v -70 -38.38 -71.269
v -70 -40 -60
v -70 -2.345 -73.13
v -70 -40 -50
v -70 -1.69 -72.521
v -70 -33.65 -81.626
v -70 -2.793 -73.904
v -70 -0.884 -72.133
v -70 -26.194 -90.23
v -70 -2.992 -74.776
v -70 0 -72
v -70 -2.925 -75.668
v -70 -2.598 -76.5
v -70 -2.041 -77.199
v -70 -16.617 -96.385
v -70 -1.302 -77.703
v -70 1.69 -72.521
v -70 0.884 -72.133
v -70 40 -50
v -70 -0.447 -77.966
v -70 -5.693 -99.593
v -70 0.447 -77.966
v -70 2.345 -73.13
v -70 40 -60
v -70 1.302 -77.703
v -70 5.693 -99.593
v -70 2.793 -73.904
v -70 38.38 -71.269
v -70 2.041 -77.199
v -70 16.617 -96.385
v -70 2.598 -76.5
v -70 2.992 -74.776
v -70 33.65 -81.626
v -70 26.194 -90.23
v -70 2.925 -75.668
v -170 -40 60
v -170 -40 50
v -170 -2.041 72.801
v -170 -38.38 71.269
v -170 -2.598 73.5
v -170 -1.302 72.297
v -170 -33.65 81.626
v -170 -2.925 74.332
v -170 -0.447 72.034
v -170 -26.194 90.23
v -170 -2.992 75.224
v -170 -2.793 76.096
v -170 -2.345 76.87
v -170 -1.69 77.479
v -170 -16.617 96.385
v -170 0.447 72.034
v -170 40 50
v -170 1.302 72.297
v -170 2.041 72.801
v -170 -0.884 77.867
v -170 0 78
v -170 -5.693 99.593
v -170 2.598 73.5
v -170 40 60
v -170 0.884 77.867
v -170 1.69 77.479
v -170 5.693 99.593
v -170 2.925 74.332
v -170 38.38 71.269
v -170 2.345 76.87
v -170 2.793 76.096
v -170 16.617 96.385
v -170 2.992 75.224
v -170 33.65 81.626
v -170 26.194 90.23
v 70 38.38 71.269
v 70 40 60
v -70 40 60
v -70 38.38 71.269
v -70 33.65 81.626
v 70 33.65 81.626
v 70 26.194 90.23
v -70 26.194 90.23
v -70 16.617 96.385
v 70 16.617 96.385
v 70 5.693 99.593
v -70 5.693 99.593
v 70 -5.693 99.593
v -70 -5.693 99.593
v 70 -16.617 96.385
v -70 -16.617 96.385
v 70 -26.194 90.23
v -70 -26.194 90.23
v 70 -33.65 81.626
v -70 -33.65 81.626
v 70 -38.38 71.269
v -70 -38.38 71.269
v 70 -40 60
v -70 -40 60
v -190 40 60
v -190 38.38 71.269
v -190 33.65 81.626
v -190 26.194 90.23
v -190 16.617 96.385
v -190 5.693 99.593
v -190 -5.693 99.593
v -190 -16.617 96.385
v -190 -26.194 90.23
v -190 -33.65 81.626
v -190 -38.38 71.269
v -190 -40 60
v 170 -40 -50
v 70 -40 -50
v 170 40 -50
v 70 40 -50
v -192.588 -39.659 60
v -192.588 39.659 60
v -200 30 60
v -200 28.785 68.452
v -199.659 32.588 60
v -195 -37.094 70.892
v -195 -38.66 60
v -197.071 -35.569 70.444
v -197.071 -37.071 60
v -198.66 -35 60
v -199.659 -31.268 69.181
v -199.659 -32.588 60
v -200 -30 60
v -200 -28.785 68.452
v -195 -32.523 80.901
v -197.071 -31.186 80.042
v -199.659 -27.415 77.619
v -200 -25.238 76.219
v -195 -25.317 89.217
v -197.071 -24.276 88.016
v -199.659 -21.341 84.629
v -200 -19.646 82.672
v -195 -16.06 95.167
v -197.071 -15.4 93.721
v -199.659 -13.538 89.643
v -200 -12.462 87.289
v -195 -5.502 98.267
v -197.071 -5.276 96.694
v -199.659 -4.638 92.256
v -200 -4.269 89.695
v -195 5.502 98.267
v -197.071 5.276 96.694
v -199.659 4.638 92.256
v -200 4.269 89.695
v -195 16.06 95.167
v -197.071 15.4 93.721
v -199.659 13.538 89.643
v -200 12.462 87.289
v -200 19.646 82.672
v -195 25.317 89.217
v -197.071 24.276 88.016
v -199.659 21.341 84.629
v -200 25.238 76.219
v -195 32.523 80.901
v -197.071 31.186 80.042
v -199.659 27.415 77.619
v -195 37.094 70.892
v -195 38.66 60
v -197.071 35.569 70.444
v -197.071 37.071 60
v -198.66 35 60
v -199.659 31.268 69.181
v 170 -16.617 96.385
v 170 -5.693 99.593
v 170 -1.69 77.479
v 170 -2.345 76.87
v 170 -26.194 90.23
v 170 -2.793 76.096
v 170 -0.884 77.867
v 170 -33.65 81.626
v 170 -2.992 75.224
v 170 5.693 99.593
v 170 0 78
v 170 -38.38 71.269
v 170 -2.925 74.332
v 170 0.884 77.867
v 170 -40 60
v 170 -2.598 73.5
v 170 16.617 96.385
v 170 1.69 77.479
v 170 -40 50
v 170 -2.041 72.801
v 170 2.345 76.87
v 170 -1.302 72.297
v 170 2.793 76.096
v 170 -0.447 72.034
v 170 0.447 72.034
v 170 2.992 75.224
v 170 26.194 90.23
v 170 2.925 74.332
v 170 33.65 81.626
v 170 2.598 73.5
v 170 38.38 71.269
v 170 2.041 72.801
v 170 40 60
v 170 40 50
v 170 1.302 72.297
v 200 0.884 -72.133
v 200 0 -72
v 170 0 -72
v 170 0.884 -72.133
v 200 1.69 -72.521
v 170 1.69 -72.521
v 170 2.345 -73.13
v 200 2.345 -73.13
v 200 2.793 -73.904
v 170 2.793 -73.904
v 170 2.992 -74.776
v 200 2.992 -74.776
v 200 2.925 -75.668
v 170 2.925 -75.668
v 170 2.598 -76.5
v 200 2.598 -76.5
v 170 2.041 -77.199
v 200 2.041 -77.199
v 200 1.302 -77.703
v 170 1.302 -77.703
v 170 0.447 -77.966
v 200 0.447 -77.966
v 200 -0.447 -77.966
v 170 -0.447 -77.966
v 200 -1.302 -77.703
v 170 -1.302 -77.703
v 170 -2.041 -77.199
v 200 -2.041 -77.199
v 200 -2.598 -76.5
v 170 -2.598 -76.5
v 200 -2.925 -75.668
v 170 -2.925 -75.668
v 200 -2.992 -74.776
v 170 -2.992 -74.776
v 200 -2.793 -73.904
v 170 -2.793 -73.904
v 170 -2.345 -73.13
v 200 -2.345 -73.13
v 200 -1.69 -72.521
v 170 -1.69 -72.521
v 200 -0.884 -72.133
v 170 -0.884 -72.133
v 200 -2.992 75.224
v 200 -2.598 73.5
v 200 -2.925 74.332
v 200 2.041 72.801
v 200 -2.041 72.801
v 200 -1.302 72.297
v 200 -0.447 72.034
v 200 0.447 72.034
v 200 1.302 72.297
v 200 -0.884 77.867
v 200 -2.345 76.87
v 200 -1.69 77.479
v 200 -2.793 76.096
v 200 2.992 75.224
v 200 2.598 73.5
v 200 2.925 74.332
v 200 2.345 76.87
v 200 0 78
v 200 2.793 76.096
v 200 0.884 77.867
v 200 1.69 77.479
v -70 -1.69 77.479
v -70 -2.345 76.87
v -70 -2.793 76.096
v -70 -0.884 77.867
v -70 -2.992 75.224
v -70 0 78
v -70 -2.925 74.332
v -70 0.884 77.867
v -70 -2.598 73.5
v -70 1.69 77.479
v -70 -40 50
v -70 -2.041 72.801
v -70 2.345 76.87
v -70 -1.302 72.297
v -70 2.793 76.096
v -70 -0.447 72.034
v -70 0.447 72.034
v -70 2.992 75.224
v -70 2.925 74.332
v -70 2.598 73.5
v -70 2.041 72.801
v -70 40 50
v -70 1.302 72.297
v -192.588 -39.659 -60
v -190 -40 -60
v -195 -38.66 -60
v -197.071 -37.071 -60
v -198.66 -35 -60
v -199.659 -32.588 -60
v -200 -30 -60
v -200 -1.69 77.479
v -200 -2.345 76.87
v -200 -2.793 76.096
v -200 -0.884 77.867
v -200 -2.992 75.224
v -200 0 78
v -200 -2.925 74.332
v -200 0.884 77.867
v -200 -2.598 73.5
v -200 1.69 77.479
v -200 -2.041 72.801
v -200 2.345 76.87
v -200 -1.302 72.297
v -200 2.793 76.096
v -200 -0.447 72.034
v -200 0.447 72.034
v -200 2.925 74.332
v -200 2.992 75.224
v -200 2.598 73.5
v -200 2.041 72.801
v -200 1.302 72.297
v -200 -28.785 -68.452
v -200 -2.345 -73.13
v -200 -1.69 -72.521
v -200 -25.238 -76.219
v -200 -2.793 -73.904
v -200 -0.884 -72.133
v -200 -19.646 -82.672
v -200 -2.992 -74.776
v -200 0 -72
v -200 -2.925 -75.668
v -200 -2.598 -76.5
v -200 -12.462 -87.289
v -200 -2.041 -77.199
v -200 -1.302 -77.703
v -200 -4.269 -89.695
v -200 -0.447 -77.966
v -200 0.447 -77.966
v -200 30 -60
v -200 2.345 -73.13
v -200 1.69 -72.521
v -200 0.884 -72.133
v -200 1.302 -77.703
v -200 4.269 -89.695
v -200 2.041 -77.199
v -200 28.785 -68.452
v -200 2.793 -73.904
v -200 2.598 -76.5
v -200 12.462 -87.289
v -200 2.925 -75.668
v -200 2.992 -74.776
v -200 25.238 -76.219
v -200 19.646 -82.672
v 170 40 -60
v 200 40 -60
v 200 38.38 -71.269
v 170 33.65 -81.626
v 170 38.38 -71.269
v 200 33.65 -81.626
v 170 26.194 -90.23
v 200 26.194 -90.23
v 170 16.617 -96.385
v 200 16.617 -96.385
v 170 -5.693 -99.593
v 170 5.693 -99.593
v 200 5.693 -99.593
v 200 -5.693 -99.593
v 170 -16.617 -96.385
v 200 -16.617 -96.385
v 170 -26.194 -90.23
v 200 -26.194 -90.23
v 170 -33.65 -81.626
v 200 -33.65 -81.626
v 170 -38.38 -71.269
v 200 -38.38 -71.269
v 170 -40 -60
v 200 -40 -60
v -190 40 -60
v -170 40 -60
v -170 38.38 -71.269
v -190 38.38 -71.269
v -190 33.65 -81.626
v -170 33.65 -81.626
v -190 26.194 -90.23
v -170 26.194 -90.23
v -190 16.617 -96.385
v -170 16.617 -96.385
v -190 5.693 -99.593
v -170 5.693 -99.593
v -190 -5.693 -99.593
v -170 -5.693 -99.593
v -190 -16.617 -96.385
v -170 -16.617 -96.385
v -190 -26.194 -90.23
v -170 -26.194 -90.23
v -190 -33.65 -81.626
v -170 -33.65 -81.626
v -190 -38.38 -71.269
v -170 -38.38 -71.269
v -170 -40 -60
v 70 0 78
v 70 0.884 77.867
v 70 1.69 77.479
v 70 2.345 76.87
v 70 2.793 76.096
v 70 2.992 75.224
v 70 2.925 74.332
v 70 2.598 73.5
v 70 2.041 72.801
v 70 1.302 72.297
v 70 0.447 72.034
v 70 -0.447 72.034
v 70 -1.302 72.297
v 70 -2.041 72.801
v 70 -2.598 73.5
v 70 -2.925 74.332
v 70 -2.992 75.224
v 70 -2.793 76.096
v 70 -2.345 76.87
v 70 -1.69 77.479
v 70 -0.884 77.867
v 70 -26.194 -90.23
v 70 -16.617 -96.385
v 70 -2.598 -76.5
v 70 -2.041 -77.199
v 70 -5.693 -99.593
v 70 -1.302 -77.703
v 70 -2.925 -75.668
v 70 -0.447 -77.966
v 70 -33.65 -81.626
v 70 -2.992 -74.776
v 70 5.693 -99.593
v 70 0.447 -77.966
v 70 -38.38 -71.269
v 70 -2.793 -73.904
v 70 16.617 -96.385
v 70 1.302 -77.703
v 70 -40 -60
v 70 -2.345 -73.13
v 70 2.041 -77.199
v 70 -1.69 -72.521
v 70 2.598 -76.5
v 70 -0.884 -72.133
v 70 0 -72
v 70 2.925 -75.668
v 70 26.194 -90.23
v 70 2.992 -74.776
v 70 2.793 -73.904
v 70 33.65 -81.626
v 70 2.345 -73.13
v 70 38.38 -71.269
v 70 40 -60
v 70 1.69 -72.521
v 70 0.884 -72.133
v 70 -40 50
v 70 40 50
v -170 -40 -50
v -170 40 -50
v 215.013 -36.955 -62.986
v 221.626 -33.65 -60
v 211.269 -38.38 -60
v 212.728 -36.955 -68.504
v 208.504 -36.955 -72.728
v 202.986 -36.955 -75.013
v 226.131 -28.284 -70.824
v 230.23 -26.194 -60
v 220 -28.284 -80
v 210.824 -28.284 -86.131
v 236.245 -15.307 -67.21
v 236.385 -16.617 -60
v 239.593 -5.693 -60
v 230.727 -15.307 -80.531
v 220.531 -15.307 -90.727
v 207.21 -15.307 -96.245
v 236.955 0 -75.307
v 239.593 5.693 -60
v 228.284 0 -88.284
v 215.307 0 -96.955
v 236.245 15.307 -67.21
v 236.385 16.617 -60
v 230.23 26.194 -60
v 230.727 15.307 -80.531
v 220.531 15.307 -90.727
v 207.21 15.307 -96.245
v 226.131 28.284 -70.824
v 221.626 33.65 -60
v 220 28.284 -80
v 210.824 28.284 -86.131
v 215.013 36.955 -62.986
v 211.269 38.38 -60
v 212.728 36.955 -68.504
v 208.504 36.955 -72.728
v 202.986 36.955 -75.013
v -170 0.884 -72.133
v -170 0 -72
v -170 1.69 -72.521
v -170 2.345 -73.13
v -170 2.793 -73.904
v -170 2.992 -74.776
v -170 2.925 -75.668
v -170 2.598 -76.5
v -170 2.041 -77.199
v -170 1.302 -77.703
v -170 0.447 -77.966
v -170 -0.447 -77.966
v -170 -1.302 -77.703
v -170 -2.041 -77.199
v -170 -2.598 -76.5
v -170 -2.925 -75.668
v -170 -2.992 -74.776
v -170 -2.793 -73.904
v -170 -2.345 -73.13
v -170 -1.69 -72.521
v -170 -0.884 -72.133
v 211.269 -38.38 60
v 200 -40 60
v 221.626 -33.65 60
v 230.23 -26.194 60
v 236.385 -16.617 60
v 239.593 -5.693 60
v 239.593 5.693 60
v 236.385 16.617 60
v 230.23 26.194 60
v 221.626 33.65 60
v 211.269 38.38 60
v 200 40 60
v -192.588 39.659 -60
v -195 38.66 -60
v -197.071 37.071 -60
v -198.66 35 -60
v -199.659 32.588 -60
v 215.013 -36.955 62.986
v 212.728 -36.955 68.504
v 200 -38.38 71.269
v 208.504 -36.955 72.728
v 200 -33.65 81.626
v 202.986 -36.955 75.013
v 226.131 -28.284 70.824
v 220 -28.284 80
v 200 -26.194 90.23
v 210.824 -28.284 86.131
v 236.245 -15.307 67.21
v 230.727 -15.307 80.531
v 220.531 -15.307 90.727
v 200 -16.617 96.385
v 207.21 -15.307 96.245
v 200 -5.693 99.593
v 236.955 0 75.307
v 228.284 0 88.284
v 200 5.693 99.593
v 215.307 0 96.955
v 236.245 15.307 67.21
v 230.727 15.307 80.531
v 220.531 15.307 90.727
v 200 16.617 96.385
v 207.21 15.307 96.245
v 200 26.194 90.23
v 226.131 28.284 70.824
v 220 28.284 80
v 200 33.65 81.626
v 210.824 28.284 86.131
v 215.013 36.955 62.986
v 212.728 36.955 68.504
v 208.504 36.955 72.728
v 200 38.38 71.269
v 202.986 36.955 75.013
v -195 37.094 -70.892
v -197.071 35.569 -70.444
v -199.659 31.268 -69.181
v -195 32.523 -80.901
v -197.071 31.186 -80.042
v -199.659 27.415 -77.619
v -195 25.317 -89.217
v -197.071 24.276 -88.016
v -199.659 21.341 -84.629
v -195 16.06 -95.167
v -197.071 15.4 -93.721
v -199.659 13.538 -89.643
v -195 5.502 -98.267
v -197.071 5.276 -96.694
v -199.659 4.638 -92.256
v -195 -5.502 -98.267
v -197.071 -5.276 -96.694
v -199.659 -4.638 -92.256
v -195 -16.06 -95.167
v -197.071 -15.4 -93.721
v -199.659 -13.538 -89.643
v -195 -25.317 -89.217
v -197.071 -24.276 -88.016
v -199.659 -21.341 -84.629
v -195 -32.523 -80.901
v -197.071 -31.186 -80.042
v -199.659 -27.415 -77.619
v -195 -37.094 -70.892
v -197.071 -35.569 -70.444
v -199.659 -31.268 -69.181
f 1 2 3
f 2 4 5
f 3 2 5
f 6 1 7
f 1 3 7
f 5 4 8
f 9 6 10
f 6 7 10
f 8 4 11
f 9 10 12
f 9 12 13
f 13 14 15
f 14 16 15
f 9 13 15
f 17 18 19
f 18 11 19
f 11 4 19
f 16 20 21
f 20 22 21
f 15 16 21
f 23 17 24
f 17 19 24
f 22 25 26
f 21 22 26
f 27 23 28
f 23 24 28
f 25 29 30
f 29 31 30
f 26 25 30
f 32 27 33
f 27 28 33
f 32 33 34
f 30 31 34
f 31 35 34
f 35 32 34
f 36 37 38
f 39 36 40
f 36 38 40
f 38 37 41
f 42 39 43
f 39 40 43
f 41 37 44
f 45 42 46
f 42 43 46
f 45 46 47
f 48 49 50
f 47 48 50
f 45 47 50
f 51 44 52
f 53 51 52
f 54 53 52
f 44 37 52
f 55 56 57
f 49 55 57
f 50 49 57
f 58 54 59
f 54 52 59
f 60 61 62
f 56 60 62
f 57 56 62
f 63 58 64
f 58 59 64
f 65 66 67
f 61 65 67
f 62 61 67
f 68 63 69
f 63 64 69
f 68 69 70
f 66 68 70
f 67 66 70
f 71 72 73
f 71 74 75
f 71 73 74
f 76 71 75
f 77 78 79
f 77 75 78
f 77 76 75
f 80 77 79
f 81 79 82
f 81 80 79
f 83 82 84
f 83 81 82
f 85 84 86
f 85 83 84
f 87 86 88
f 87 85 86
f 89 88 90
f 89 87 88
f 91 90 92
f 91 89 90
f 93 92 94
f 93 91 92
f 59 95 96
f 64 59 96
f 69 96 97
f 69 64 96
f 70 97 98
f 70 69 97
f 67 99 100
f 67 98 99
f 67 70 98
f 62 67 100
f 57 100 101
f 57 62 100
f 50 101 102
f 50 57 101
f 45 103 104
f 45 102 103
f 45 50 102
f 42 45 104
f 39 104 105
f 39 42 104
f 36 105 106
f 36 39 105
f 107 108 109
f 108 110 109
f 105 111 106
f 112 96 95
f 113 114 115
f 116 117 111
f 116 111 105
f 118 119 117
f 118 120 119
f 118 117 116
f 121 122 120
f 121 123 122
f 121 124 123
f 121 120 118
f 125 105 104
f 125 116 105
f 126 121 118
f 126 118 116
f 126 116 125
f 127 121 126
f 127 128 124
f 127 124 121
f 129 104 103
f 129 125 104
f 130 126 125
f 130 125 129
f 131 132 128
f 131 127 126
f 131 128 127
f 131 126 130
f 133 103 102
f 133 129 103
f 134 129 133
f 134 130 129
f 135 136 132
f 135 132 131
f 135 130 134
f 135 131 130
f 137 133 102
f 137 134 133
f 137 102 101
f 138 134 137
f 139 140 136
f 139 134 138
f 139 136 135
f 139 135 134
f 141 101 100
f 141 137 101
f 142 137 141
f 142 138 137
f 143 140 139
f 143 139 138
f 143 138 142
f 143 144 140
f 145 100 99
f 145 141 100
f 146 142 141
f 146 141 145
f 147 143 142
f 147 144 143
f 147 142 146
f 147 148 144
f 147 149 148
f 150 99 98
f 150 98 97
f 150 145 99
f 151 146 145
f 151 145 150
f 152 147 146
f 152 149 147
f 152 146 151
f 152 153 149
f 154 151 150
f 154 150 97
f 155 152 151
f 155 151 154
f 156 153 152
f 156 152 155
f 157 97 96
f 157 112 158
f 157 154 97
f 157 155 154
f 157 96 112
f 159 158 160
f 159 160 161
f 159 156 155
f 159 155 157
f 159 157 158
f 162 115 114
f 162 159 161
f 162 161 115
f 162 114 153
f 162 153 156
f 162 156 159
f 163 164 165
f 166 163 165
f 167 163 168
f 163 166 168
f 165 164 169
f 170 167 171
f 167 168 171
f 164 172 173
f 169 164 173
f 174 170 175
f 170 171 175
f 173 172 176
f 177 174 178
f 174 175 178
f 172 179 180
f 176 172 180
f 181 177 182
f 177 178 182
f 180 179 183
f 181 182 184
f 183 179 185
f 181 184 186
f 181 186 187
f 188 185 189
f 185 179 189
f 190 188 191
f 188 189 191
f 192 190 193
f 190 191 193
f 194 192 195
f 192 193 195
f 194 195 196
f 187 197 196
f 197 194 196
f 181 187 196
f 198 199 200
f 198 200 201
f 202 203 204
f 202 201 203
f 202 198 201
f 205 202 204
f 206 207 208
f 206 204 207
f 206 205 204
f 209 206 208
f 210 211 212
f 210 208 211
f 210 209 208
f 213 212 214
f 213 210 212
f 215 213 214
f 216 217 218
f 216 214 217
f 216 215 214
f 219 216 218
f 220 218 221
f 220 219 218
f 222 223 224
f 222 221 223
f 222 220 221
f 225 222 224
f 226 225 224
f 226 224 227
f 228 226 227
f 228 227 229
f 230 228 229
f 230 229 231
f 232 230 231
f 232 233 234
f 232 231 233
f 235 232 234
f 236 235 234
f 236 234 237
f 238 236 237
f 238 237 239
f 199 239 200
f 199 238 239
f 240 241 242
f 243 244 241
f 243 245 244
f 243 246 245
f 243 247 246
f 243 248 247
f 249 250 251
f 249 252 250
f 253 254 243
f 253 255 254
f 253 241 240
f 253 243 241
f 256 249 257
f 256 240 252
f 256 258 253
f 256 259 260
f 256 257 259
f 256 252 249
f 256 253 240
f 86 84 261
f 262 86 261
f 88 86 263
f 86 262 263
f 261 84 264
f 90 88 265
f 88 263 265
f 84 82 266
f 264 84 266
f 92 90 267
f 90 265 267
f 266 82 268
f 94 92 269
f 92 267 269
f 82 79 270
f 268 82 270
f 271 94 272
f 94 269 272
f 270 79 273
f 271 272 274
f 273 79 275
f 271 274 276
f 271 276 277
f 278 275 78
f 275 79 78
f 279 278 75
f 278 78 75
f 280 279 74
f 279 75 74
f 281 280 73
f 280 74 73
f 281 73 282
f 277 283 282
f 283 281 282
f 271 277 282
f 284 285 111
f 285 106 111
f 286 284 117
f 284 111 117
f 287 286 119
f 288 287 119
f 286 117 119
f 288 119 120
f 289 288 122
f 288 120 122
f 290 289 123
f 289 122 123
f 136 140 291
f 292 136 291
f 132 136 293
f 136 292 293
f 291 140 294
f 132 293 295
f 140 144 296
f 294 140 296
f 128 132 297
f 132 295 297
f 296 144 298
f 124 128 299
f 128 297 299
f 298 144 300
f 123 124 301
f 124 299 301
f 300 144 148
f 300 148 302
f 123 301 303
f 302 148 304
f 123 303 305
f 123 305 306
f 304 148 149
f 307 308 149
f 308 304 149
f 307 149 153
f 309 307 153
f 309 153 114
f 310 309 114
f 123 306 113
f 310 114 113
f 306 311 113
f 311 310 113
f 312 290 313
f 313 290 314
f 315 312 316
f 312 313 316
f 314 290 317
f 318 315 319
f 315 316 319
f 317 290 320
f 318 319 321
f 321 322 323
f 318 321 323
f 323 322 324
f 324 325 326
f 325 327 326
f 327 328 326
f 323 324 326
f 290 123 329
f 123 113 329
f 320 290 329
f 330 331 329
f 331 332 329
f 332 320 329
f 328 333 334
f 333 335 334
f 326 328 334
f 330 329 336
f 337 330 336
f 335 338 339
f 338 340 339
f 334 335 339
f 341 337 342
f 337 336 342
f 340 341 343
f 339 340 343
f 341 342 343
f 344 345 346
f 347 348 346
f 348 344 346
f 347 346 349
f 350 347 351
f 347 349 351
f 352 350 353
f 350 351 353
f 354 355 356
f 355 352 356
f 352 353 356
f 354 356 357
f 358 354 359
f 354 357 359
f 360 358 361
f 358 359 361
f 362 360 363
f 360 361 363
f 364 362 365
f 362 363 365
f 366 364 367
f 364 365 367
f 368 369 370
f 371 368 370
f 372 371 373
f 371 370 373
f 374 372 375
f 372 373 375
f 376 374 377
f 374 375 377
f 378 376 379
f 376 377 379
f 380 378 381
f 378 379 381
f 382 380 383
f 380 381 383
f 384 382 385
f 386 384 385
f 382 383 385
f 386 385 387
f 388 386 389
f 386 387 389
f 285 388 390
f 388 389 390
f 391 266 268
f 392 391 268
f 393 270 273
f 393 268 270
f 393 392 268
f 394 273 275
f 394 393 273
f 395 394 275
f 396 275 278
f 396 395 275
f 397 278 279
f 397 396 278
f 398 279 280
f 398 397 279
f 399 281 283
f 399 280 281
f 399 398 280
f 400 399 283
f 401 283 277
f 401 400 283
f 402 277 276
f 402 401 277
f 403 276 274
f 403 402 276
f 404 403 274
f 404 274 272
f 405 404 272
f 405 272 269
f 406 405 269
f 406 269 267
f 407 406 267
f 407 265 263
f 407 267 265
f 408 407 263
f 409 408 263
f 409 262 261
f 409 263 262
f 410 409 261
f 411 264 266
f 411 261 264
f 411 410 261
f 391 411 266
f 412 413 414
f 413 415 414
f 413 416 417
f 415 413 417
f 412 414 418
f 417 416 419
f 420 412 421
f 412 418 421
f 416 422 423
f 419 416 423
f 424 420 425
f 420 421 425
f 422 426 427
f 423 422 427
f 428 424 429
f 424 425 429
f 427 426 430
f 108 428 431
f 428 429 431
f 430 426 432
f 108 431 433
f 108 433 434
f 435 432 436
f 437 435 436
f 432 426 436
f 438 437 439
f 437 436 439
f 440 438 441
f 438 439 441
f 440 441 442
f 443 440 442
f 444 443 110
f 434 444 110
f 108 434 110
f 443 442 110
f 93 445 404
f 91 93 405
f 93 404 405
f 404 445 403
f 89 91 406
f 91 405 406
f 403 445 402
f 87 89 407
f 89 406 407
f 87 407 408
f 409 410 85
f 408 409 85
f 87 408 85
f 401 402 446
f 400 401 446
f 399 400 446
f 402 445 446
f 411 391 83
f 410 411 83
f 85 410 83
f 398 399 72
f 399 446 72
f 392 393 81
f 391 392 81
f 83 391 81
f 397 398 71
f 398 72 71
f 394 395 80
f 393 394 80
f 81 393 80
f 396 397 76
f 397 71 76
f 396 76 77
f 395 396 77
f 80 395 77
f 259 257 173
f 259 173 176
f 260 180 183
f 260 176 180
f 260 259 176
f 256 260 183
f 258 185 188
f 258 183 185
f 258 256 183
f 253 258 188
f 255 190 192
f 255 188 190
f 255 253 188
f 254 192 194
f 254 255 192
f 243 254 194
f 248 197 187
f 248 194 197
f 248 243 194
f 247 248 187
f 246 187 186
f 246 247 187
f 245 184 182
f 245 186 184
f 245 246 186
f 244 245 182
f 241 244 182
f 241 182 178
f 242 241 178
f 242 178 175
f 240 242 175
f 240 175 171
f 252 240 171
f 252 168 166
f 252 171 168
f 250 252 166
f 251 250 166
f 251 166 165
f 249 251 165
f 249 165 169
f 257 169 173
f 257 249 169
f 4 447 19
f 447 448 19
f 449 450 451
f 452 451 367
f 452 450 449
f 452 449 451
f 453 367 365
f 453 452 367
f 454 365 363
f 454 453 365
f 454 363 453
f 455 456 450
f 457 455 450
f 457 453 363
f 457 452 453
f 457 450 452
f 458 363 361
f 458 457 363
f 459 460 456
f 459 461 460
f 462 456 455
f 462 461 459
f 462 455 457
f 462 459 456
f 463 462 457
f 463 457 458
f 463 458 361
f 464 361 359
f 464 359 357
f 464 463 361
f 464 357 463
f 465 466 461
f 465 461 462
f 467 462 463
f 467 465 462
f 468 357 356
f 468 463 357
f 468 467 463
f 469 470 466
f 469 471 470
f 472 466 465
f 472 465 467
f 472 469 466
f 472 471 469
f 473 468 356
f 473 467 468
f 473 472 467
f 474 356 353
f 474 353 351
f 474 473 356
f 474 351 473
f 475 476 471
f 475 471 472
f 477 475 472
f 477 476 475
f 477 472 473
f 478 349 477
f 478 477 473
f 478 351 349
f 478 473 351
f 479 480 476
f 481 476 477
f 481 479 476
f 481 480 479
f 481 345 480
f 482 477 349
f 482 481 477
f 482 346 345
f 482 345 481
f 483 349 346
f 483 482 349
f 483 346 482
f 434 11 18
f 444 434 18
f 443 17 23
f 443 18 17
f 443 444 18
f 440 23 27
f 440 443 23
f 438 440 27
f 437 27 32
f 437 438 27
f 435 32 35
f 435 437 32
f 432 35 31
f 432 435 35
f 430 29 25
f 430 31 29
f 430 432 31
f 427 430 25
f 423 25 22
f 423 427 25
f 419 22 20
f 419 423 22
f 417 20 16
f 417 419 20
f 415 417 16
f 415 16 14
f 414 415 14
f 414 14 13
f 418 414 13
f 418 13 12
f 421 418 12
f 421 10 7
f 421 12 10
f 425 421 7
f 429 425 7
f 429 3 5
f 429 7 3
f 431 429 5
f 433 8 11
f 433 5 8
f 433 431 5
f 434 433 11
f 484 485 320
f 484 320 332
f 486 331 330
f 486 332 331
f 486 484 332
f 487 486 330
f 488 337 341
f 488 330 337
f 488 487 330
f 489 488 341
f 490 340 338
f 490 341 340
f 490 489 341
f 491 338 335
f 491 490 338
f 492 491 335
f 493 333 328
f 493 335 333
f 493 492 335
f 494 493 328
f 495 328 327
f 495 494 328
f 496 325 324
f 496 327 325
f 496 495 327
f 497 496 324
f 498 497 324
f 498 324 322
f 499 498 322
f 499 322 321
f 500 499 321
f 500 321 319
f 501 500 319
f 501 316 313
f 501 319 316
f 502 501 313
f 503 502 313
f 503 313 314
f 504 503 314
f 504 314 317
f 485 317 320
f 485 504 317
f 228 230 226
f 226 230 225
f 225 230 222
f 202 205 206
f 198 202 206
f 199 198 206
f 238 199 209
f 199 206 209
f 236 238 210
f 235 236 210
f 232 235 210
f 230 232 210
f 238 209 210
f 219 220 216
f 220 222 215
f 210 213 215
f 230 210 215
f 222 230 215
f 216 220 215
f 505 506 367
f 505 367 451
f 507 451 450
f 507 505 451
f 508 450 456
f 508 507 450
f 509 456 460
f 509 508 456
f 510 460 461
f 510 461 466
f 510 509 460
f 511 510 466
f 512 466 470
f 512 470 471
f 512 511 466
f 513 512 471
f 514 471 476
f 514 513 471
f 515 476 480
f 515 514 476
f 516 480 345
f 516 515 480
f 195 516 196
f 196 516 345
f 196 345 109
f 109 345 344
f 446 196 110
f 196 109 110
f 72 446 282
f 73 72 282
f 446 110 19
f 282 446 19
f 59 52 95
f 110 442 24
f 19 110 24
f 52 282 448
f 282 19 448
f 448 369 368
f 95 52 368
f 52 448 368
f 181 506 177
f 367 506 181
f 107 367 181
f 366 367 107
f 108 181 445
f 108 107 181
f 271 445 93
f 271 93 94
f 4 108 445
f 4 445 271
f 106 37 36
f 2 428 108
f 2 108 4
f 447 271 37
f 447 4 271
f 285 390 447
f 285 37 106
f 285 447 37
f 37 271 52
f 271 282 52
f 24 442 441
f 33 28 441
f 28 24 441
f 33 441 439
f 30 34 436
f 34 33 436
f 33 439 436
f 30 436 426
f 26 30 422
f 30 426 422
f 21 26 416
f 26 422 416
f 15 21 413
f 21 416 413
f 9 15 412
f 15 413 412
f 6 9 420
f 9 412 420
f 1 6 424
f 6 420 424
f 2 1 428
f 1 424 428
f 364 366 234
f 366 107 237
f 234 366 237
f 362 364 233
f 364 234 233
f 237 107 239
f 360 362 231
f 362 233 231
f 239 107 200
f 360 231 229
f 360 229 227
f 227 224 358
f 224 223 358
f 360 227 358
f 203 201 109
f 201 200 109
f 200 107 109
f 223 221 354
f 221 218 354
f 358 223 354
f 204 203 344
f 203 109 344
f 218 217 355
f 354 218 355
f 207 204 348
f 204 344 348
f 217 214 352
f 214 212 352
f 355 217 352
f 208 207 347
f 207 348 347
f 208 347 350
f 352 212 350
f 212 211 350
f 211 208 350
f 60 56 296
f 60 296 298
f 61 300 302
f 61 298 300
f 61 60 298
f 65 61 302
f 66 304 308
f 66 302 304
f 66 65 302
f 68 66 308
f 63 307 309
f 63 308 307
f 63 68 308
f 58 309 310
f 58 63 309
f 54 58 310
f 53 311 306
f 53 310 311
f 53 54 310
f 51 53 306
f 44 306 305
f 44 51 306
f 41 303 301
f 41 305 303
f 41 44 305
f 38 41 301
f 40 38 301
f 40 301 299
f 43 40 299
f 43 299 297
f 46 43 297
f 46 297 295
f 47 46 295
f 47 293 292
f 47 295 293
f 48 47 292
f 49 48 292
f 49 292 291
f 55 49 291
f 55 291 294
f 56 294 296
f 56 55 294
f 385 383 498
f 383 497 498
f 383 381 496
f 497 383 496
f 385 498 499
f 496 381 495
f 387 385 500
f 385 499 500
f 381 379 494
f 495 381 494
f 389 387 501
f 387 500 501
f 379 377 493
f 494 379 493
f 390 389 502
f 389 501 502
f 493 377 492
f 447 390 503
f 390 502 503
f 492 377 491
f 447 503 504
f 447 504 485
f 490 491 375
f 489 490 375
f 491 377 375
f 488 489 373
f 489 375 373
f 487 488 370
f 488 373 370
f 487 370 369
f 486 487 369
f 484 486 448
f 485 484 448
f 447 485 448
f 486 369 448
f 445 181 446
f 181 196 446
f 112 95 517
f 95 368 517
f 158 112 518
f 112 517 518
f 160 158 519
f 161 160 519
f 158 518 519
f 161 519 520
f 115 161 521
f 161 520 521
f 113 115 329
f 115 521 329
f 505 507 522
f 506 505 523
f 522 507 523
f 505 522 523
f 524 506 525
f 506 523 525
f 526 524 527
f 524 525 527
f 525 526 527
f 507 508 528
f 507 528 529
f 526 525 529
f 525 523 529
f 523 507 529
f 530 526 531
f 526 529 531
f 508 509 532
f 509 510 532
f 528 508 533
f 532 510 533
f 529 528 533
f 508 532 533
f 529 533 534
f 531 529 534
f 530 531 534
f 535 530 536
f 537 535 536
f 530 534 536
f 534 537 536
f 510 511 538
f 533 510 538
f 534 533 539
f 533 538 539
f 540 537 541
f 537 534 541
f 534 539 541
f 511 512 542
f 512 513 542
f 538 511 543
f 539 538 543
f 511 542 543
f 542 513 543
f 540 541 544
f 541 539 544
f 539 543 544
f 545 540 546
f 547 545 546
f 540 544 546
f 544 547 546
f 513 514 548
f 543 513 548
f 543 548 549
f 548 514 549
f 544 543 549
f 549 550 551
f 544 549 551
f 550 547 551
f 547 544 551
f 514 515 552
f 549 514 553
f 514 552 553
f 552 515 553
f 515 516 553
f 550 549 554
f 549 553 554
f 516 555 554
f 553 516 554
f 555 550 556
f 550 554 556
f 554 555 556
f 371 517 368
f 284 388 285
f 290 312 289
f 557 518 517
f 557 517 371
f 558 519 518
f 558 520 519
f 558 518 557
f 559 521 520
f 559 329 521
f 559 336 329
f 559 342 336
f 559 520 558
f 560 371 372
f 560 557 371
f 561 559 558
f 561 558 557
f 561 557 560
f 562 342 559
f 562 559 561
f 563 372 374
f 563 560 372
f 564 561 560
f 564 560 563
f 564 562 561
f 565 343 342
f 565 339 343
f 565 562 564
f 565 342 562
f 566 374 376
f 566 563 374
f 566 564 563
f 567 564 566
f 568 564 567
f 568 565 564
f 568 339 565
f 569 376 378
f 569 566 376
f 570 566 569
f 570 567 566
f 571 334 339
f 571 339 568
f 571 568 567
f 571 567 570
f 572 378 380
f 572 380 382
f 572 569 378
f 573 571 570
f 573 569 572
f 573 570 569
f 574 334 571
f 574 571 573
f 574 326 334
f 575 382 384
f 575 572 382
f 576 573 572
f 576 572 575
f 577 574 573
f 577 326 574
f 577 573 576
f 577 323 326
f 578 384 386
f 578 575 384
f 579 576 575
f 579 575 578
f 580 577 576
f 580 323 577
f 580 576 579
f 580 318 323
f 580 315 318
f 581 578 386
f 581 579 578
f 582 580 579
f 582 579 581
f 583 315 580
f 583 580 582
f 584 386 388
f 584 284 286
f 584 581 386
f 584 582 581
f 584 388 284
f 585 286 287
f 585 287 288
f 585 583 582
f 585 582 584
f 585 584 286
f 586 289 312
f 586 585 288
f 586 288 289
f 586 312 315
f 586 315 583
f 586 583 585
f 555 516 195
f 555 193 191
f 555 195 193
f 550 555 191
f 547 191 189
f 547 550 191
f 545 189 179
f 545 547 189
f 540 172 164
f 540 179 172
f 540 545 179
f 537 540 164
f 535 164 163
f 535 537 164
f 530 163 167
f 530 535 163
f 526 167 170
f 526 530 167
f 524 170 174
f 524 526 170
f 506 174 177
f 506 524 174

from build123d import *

# Parameters (mm, degrees)
BOSS_EXTRUDE1_DEPTH     = 40
CUT_EXTRUDE1_DEPTH      = 291.688837075
CUT_EXTRUDE1_DEPTH_BACK = 291.688837075
SKETCH2_R               = 3
CUT_EXTRUDE2_DEPTH      = 291.688837075
CUT_EXTRUDE2_DEPTH_BACK = 291.688837075
SKETCH3_R               = 3
CUT_EXTRUDE3_DEPTH      = 415.246303544
CUT_EXTRUDE3_DEPTH_BACK = 415.246303544
CUT_EXTRUDE4_DEPTH      = 415.246303544
CUT_EXTRUDE4_DEPTH_BACK = 415.246303544
BOSS_EXTRUDE3_DEPTH     = 60
REVOLVE1_ANGLE          = 90
FILLET1_R               = 10


with BuildPart() as part:
    # Sketch1 → Boss-Extrude1 (new, symmetric)
    with BuildSketch(Plane(origin=(0, 0, 0), x_dir=(1, 0, 0), z_dir=(0, 1, 0))):
        Polygon((-200, 100), (-170, 100), (-170, 50), (-70, 50), (-70, 100), (70, 100), (70, 50), (170, 50), (170, 100), (200, 100), (200, -100), (170, -100), (170, -50), (70, -50), (70, -100), (-70, -100), (-70, -50), (-170, -50), (-170, -100), (-200, -100), align=None)
    extrude(amount=BOSS_EXTRUDE1_DEPTH, both=True)

    # Sketch2 → Cut-Extrude1 (cut, two sides: drawn at the far end of the back side and taken through both)
    with BuildSketch(Plane.ZY.offset(70).offset(-CUT_EXTRUDE1_DEPTH_BACK)):
        with Locations((-75, 0)):
            Circle(SKETCH2_R)
    extrude(amount=CUT_EXTRUDE1_DEPTH + CUT_EXTRUDE1_DEPTH_BACK, mode=Mode.SUBTRACT)

    # Sketch3 → Cut-Extrude2 (cut, two sides: drawn at the far end of the back side and taken through both)
    with BuildSketch(Plane.ZY.offset(70).offset(-CUT_EXTRUDE2_DEPTH_BACK)):
        with Locations((75, 0)):
            Circle(SKETCH3_R)
    extrude(amount=CUT_EXTRUDE2_DEPTH + CUT_EXTRUDE2_DEPTH_BACK, mode=Mode.SUBTRACT)

    # Sketch4 → Cut-Extrude3 (cut, two sides: drawn at the far end of the back side and taken through both)
    with BuildSketch(Plane.ZY.offset(200).offset(-CUT_EXTRUDE3_DEPTH_BACK)):
        with BuildLine():
            Line((-60, -40), (-60, -70.289993794))
            Line((-60, -70.289993794), (-136.864216991, -70.289993794))
            Line((-136.864216991, -70.289993794), (-136.864216991, 63.942219024))
            Line((-136.864216991, 63.942219024), (-60, 63.942219024))
            Line((-60, 63.942219024), (-60, 40))
            ThreePointArc((-60, 40), (-100, 0), (-60, -40))
        make_face()
    extrude(amount=CUT_EXTRUDE3_DEPTH + CUT_EXTRUDE3_DEPTH_BACK, mode=Mode.SUBTRACT)

    # Sketch5 → Cut-Extrude4 (cut, two sides: drawn at the far end of the back side and taken through both)
    with BuildSketch(Plane.ZY.offset(200).offset(-CUT_EXTRUDE4_DEPTH_BACK)):
        with BuildLine():
            Line((60, -40), (60, -76.328121014))
            Line((60, -76.328121014), (141.05428579, -76.328121014))
            Line((141.05428579, -76.328121014), (141.05428579, 68.89657982))
            Line((141.05428579, 68.89657982), (60, 68.89657982))
            Line((60, 68.89657982), (60, 40))
            ThreePointArc((60, 40), (100, 0), (60, -40))
        make_face()
    extrude(amount=CUT_EXTRUDE4_DEPTH + CUT_EXTRUDE4_DEPTH_BACK, mode=Mode.SUBTRACT)

    # Sketch7 → Boss-Extrude3 (add, symmetric)
    with BuildSketch(Plane.XY):
        with BuildLine():
            Line((200, 40), (200, -40))
            ThreePointArc((200, -40), (240, 0), (200, 40))
        make_face()
    extrude(amount=BOSS_EXTRUDE3_DEPTH, both=True)

    # Sketch8 → Revolve1 (revolve)
    with BuildSketch(Plane.XY.offset(60)):
        with BuildLine():
            Line((200, 40), (200, -40))
            ThreePointArc((200, -40), (240, 0), (200, 40))
        make_face()
    revolve1 = revolve(axis=Axis((200, 40, 60), (0, -1, 0)), revolution_arc=REVOLVE1_ANGLE)

    # Mirror1: Revolve1 across plane
    add(revolve1.mirror(Plane.XY))

    # Fillet1
    fillet1_edges = [part.edges().sort_by_distance(p)[0] for p in [
        (-200, 0, 100),
        (-200, -40, 0),
        (-200, 40, 0),
        (-200, 0, -100),
    ]]
    fillet(fillet1_edges, radius=FILLET1_R)


solid = part.part
